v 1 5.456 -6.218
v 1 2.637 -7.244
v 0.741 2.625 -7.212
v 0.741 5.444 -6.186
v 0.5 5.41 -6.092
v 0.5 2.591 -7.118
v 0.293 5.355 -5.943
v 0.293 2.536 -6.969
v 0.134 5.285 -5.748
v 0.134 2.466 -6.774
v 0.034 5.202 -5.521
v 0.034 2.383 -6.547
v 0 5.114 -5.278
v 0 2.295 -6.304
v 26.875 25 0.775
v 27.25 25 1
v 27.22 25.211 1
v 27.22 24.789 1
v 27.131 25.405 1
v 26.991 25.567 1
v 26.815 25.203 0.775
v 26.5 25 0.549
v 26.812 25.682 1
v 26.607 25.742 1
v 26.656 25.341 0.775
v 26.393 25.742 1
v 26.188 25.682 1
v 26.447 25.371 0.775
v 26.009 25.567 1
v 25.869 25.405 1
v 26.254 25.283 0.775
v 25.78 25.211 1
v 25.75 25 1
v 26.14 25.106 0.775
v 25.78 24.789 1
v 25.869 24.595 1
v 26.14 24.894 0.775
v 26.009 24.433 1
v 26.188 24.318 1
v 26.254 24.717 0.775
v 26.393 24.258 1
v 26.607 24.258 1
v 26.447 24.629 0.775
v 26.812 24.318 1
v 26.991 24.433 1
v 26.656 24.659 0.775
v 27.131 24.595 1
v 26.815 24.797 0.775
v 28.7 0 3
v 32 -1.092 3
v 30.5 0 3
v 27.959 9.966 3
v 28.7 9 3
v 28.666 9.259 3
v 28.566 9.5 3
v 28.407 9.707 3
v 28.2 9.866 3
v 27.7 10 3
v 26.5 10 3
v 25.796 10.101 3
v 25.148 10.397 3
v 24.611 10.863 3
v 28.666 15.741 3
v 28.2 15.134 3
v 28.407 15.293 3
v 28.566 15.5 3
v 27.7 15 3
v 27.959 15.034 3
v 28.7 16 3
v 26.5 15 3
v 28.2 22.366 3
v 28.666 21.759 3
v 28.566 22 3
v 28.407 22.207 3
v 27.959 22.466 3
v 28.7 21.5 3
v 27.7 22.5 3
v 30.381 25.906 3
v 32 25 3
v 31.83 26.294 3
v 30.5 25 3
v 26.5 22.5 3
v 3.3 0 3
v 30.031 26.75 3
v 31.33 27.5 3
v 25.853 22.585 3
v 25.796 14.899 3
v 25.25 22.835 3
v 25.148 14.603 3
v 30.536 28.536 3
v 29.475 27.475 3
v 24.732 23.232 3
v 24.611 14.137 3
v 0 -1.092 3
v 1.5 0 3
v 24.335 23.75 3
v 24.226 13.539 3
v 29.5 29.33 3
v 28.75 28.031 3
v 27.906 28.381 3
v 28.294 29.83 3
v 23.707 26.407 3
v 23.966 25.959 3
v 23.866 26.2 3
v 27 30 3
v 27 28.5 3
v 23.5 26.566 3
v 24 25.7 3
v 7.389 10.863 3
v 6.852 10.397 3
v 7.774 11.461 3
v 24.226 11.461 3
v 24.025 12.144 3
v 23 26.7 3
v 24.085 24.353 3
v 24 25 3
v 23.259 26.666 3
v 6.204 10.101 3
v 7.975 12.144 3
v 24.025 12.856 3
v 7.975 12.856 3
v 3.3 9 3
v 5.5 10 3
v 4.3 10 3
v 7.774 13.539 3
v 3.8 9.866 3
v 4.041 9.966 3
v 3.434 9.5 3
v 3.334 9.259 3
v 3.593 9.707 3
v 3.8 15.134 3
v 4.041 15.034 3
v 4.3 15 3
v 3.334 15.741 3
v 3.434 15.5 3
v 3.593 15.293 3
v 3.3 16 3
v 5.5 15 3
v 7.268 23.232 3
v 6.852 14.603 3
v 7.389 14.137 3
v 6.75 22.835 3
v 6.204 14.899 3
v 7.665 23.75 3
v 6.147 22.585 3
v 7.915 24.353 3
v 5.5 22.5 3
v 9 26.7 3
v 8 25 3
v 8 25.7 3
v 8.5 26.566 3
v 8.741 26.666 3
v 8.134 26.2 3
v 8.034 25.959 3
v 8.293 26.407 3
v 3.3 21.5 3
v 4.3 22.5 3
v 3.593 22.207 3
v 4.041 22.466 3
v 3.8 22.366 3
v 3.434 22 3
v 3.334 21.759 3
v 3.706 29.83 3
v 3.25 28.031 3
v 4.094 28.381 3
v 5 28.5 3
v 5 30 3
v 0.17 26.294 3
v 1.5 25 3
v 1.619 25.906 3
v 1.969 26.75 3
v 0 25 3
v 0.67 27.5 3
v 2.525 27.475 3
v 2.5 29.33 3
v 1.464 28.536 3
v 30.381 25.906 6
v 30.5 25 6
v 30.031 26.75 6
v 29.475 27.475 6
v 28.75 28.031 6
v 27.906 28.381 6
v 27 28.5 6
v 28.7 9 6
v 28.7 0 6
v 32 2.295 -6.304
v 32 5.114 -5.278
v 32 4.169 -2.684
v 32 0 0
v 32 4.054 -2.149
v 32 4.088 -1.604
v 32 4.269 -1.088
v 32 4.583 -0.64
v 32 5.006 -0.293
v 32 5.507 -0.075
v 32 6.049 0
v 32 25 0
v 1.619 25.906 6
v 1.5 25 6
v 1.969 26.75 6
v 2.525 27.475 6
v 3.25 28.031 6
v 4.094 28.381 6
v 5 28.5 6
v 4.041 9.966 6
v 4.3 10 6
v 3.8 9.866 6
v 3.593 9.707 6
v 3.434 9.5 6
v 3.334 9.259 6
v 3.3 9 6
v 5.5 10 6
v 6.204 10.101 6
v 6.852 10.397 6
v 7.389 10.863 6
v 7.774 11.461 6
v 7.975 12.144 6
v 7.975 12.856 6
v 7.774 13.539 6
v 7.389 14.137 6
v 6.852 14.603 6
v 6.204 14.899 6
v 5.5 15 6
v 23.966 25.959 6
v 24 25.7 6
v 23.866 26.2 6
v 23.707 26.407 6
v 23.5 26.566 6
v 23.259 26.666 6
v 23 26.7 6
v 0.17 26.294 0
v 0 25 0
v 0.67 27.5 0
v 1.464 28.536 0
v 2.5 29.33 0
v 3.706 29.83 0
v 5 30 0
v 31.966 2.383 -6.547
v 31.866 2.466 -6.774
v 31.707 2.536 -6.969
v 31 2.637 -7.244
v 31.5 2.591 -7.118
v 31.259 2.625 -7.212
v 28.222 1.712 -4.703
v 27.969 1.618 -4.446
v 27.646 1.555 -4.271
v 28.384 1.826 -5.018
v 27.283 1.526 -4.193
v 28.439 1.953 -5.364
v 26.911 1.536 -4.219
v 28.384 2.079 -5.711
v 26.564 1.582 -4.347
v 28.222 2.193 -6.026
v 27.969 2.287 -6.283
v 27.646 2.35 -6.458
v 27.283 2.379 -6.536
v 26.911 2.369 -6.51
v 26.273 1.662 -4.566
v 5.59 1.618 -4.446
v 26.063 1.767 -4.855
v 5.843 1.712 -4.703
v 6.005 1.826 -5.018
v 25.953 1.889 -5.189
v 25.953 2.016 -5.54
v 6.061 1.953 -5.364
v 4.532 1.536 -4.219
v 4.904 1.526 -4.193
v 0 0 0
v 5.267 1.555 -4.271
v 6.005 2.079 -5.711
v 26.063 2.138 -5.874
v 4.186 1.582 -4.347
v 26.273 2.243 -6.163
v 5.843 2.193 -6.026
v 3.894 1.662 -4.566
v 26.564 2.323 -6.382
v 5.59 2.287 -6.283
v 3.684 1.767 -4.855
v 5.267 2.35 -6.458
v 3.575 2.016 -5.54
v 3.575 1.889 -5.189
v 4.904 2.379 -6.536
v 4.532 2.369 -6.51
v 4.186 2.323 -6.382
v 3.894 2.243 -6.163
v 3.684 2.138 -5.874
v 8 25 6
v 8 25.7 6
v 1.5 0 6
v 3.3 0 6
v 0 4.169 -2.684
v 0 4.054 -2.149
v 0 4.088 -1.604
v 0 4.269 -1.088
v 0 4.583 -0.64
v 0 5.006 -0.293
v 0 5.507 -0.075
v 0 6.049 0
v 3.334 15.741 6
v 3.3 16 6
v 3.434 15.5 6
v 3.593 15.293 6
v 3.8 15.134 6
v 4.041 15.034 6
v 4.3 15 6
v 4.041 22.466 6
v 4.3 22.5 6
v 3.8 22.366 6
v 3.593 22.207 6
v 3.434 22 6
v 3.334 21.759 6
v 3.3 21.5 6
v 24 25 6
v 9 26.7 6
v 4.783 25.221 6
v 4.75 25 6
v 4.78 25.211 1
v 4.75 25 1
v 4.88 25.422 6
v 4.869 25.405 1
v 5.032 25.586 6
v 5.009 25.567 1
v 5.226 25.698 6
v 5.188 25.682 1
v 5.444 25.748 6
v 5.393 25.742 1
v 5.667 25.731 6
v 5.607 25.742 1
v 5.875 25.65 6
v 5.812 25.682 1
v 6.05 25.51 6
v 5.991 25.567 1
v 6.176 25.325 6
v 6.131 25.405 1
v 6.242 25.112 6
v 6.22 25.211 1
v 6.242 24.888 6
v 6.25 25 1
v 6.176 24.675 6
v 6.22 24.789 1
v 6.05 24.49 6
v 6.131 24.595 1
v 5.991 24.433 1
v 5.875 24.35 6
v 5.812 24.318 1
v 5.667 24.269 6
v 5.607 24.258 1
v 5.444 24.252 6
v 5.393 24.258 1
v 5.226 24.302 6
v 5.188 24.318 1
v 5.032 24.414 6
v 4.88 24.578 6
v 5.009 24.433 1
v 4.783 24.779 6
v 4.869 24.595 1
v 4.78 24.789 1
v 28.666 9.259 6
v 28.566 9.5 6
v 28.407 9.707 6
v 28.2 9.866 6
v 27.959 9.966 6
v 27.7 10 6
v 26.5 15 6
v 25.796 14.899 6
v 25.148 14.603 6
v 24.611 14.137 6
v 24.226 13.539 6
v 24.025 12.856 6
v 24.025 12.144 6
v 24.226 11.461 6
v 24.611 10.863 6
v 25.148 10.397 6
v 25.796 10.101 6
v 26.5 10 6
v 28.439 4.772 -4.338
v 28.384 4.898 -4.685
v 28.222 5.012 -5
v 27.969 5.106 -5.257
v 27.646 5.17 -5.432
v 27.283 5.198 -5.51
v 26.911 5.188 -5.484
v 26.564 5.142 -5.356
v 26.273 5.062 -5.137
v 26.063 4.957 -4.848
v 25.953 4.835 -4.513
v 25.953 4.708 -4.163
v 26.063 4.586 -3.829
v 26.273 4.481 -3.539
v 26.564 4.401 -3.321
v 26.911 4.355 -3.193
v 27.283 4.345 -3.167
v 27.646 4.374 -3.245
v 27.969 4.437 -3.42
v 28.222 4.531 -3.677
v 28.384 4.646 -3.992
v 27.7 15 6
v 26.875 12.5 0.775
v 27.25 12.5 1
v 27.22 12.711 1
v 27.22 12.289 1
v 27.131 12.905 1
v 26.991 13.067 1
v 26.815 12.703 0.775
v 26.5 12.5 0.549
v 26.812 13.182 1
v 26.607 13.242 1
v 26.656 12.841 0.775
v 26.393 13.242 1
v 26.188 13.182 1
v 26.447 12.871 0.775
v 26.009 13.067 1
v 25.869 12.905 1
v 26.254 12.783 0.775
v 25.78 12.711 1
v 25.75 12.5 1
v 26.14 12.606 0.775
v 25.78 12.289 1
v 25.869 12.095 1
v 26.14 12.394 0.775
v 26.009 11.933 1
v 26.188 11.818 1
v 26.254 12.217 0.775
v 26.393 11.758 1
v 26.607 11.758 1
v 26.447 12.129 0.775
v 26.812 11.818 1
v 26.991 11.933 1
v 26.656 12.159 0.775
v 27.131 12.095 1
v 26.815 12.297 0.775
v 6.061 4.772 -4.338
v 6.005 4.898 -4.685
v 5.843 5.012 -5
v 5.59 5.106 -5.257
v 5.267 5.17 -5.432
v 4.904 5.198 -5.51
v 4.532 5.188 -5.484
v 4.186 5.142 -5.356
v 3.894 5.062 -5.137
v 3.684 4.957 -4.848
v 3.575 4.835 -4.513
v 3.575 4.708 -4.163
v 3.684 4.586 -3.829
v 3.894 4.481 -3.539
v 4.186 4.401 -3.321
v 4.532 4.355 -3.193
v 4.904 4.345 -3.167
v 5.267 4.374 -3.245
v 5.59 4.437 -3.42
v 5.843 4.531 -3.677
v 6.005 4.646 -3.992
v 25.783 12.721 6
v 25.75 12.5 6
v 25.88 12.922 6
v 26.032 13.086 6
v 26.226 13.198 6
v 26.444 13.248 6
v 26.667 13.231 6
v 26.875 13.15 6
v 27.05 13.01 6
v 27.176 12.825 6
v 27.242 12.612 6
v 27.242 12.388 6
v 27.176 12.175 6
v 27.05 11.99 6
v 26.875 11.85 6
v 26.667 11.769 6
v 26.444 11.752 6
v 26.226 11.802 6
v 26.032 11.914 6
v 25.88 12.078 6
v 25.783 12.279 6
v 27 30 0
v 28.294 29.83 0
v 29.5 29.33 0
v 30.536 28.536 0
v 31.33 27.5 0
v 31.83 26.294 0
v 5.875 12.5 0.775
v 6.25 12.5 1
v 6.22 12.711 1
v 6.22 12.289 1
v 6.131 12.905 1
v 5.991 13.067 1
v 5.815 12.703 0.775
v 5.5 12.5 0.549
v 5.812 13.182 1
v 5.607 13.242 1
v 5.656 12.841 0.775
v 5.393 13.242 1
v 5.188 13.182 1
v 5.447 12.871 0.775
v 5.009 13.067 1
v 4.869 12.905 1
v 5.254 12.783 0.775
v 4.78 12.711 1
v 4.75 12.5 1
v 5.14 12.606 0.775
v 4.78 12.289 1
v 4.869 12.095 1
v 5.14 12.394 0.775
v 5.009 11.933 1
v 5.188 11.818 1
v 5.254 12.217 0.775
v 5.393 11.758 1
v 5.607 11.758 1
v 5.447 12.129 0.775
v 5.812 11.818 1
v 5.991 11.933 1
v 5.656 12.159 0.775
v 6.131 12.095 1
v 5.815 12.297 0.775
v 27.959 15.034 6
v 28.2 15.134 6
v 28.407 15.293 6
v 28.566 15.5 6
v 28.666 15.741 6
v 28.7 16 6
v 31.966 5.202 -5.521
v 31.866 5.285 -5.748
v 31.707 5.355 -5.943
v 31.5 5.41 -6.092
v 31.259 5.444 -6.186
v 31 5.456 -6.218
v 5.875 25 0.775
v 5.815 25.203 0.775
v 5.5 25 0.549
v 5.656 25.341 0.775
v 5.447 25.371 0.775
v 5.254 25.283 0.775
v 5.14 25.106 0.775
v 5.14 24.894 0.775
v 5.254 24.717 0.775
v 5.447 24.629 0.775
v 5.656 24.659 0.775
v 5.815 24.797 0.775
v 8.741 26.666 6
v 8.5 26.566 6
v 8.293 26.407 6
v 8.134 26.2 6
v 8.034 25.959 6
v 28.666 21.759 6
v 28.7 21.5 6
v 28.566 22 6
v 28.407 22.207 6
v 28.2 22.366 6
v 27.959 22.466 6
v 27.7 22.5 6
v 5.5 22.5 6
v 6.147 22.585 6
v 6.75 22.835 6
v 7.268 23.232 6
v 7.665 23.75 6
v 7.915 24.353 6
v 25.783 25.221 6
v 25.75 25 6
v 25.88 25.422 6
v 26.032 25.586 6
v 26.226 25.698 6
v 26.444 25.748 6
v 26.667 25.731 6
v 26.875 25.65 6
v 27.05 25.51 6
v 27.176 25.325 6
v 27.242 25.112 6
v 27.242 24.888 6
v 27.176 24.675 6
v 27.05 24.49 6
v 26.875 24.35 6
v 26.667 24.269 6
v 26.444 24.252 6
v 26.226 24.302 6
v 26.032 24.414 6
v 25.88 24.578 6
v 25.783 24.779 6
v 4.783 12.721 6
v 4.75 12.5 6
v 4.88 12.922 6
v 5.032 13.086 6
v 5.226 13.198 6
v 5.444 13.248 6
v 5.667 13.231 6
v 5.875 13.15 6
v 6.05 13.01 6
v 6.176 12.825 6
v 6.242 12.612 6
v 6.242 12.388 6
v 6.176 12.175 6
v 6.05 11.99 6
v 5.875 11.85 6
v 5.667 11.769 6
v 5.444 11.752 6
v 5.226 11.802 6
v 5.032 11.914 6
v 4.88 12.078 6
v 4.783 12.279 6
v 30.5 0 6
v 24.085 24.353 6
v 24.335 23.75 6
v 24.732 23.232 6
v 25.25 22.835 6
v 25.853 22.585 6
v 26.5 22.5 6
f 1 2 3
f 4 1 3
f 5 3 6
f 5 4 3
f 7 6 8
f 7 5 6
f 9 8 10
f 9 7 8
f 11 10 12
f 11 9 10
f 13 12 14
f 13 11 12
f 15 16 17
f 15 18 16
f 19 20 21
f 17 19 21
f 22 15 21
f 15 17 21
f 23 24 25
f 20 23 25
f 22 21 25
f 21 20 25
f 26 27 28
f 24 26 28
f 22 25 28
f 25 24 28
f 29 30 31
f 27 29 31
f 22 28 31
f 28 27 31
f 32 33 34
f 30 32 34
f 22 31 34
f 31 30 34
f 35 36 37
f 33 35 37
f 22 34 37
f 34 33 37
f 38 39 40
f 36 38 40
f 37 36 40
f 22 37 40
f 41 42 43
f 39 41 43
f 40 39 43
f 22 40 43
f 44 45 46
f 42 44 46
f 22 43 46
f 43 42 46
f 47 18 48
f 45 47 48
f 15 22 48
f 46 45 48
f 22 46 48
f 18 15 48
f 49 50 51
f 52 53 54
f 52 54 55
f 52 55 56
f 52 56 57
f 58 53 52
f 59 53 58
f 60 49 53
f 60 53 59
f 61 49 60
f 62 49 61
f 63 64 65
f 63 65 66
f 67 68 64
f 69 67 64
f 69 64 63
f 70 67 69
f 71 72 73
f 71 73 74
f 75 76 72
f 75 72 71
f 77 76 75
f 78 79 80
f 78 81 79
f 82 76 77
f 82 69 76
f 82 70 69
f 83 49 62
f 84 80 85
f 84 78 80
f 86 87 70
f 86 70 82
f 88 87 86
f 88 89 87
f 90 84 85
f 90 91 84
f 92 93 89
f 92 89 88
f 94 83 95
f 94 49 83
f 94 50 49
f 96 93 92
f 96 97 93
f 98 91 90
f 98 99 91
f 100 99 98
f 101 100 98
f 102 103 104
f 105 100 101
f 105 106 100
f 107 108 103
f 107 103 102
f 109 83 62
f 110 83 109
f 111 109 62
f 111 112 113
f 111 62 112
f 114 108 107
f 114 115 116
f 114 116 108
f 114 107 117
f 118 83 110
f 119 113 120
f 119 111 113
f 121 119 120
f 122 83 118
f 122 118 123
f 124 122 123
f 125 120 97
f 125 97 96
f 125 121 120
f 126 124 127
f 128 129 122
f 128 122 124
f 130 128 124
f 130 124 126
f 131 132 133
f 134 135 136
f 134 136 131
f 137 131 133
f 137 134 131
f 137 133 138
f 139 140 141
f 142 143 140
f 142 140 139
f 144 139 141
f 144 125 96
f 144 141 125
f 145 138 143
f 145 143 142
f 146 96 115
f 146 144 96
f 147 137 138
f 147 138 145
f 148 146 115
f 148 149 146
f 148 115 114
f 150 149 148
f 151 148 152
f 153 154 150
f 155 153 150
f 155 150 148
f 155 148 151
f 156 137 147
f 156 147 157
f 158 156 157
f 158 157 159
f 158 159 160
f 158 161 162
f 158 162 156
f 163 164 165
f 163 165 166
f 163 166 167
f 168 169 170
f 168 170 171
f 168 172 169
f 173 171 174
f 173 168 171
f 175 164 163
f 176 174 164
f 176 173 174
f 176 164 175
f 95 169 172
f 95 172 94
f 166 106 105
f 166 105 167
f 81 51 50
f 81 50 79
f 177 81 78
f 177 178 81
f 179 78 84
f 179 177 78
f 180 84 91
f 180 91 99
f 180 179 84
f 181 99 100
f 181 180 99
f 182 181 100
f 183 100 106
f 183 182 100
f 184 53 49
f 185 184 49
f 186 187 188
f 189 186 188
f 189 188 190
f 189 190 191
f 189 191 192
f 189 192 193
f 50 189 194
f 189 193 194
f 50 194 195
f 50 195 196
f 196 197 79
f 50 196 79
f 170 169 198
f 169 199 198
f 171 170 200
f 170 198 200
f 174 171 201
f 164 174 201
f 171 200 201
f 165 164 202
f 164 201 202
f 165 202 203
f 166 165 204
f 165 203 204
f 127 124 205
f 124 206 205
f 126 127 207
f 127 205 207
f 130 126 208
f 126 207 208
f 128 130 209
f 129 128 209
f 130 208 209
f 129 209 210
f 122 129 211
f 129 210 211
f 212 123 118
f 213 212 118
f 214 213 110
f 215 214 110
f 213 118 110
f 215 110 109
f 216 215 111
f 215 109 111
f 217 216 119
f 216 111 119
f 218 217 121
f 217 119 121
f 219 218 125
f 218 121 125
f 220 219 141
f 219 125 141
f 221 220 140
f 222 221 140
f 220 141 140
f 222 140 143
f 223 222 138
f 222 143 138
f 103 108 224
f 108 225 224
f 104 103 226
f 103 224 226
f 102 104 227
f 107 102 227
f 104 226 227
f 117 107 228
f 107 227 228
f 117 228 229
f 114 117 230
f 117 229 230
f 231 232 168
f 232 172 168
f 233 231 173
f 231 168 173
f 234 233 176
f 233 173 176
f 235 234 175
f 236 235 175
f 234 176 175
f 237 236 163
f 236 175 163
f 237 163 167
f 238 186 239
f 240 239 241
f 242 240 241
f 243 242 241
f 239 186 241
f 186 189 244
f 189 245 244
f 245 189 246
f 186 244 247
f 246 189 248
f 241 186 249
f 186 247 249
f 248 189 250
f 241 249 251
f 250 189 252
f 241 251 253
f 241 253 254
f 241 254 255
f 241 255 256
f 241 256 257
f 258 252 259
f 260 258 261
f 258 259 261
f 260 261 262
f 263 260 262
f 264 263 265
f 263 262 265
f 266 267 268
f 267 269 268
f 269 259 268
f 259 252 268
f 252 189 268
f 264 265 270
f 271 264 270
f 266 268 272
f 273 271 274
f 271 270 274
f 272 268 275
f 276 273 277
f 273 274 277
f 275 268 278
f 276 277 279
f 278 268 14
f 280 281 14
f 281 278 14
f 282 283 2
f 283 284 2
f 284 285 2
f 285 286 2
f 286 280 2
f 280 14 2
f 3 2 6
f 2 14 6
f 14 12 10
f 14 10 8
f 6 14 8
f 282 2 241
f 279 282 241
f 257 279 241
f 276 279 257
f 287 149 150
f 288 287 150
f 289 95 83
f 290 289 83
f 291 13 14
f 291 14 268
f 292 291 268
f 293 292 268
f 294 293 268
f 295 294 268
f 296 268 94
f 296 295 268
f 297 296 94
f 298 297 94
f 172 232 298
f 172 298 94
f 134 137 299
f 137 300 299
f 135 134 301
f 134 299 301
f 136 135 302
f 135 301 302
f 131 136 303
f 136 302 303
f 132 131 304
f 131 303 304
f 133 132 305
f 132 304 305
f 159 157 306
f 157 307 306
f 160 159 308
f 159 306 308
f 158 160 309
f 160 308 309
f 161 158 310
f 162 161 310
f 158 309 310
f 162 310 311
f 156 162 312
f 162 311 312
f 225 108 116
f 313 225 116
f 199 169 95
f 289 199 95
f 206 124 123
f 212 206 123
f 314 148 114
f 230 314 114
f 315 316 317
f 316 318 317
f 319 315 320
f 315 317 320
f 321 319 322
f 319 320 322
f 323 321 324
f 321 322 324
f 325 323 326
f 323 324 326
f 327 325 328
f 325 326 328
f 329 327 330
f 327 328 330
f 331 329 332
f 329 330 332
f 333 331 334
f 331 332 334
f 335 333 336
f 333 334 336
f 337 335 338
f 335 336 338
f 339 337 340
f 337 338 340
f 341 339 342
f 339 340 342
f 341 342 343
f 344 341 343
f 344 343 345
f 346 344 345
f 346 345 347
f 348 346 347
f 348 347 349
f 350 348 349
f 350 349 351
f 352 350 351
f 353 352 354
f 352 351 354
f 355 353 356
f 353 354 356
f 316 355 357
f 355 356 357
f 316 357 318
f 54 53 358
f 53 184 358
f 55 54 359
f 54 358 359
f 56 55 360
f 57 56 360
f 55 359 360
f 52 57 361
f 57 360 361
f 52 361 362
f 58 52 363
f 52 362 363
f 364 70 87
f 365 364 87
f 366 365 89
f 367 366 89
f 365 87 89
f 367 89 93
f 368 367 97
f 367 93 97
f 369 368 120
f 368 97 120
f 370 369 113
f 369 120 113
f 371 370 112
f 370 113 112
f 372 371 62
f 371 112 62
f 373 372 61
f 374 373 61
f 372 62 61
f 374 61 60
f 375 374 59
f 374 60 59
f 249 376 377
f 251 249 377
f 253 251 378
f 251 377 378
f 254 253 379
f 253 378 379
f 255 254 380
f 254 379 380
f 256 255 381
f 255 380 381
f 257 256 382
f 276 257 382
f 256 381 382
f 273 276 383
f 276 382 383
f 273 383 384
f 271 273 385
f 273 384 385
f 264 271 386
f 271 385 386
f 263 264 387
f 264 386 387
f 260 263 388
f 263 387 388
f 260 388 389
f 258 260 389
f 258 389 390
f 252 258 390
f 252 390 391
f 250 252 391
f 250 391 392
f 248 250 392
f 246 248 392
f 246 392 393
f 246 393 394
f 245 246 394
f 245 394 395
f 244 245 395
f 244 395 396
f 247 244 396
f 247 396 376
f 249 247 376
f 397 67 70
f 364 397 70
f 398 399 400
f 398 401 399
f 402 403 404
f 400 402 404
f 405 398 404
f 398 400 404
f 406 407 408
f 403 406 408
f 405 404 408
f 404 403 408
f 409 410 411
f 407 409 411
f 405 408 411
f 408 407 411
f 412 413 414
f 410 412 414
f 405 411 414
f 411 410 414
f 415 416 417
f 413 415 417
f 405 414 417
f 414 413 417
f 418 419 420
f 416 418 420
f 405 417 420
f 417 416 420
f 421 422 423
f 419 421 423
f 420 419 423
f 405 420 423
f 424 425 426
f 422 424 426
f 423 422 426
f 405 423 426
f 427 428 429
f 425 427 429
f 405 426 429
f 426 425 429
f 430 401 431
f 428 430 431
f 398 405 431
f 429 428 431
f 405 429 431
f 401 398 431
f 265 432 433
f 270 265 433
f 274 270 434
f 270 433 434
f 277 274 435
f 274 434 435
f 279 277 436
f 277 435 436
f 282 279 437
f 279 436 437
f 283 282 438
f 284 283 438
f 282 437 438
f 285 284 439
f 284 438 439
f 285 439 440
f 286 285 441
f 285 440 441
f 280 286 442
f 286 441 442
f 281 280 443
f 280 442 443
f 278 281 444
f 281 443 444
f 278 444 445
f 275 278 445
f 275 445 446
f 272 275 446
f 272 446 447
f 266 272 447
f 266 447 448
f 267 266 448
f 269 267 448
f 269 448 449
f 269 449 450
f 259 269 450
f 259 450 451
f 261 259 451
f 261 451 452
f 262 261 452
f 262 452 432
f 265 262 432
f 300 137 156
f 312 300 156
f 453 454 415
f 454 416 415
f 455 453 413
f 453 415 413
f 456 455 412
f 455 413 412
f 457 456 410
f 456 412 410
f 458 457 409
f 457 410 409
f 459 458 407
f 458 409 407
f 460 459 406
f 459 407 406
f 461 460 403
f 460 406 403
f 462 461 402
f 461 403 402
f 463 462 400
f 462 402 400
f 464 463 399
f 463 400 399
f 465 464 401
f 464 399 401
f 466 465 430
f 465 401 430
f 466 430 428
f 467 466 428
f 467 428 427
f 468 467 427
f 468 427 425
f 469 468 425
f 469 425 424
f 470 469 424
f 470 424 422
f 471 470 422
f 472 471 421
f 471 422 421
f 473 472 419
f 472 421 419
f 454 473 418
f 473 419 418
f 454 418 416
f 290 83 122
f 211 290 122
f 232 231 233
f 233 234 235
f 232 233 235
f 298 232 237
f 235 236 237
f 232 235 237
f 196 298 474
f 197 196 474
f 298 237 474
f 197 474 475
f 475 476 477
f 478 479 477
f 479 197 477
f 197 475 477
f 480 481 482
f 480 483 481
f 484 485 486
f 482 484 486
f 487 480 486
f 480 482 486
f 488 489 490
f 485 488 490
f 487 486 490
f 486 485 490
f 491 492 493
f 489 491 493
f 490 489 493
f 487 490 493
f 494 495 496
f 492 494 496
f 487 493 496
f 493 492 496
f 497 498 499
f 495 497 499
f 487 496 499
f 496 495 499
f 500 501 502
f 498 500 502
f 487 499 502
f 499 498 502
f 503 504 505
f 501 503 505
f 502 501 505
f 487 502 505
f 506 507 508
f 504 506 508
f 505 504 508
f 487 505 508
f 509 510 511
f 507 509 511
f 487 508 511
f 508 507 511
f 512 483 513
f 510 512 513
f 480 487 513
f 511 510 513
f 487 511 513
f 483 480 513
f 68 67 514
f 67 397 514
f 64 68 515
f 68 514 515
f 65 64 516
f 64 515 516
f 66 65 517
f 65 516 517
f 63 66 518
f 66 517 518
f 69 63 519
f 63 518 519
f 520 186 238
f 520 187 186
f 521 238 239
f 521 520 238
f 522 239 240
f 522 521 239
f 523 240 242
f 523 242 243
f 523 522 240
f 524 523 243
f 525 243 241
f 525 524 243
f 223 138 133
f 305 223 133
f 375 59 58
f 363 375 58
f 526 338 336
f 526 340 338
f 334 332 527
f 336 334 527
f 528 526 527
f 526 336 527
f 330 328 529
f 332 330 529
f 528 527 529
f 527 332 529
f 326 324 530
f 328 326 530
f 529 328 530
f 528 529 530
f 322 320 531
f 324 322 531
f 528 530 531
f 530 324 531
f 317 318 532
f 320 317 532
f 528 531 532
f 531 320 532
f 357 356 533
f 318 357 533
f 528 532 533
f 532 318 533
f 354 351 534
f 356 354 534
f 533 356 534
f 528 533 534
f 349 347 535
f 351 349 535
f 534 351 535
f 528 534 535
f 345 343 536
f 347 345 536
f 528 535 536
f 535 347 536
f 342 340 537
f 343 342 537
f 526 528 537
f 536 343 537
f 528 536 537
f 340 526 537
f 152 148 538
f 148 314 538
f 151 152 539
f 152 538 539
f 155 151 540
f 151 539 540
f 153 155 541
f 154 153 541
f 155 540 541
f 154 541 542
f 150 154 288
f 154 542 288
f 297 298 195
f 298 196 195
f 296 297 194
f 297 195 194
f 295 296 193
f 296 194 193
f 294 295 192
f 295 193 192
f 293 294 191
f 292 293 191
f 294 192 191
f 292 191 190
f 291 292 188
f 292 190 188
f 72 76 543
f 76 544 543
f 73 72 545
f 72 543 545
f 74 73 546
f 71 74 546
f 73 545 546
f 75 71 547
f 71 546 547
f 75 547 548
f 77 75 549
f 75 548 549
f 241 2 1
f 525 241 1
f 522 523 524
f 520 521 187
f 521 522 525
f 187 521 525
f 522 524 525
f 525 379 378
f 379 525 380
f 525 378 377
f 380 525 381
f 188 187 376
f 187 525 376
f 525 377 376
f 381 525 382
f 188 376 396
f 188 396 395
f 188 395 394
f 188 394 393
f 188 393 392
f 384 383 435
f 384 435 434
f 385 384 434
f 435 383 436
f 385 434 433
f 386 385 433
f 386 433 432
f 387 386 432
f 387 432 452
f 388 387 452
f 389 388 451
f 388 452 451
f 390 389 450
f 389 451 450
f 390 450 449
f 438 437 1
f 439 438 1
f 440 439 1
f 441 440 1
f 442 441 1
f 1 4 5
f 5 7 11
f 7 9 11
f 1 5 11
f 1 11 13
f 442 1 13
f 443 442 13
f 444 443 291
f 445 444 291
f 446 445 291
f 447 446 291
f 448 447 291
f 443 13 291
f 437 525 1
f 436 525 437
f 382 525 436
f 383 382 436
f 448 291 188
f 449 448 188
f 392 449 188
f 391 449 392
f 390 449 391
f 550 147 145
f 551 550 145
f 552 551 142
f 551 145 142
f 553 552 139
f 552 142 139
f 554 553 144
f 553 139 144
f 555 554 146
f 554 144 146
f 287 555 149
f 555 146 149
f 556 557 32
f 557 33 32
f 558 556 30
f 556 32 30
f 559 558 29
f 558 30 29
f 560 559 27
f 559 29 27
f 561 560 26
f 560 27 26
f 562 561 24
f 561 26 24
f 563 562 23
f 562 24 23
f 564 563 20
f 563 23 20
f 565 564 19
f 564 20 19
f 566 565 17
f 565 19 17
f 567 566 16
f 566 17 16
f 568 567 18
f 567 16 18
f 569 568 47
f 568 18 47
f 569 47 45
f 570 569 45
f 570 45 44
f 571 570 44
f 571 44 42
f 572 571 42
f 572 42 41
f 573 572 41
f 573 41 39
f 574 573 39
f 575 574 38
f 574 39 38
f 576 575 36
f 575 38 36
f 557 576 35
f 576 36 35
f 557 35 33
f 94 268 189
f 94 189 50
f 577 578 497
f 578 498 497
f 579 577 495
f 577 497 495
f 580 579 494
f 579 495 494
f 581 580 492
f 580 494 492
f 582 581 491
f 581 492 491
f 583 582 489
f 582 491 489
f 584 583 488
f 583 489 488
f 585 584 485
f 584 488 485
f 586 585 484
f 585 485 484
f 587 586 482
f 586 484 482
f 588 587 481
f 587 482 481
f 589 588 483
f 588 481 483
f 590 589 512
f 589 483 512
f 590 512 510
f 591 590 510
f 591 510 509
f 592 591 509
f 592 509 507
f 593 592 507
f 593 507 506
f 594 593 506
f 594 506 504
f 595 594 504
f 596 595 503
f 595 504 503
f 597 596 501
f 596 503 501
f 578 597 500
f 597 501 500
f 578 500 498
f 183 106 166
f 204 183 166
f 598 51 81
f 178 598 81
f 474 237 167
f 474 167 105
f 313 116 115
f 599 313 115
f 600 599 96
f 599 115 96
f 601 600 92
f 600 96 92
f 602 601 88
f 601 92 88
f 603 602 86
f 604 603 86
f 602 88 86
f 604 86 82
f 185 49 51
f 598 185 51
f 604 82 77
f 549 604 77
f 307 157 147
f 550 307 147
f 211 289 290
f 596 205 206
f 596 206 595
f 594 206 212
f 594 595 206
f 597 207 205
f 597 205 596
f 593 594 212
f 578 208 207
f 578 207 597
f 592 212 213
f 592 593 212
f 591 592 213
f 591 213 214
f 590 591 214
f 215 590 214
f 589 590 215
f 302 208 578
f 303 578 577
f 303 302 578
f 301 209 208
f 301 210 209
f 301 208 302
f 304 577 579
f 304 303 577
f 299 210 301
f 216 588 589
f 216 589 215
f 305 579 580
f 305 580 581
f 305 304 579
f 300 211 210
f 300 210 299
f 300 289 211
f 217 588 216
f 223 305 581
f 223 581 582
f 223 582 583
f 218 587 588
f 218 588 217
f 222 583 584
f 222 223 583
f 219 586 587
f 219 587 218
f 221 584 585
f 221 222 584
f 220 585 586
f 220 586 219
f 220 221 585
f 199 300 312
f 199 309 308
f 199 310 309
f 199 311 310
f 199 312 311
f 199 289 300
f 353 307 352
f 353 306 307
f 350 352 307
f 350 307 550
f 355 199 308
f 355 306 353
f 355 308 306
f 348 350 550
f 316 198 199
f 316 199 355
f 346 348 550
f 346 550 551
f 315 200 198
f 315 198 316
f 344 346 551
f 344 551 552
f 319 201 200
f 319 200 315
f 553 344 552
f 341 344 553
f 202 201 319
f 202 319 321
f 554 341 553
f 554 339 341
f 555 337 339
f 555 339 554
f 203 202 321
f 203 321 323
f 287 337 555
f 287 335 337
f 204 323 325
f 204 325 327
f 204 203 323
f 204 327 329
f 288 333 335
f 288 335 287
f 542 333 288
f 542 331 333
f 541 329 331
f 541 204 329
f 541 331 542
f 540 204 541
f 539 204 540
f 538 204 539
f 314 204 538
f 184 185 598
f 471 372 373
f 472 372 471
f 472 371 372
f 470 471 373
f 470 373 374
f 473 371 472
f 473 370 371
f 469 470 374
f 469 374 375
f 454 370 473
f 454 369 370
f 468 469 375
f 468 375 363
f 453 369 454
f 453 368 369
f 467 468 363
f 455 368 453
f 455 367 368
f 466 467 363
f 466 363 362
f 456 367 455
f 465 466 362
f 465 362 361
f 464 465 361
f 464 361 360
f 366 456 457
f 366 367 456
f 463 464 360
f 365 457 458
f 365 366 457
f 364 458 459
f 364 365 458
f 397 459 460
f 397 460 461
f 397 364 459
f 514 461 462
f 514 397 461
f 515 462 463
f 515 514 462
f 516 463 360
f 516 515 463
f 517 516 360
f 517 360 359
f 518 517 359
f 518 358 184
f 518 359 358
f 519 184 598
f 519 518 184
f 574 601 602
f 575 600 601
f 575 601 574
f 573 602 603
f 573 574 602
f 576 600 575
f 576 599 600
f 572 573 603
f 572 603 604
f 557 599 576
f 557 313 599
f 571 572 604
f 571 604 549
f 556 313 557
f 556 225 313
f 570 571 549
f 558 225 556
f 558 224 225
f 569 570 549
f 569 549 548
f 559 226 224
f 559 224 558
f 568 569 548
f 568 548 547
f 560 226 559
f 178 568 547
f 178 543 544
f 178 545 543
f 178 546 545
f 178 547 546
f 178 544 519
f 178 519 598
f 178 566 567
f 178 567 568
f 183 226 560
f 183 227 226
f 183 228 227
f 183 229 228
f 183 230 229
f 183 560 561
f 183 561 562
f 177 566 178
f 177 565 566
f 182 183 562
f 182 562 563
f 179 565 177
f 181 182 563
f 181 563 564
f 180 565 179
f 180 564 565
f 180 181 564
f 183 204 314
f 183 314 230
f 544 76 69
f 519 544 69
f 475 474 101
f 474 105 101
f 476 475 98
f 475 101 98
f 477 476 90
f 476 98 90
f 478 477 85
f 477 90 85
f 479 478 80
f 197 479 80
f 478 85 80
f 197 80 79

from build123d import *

# Parameters (mm, degrees)
SKETCH1_W                           = 32
SKETCH1_H                           = 30
BOSS_EXTRUDE1_DEPTH                 = 3
BOSS_EXTRUDE2_DEPTH                 = 3
F_1_5MM_CLEARANCE_DOWEL_HOLE1_D     = 1.5
F_1_5MM_CLEARANCE_DOWEL_HOLE1_DEPTH = 5
F_1_5MM_CLEARANCE_DOWEL_HOLE1_TIP   = 0.450645464
FILLET1_R                           = 5
FILLET2_R                           = 3.5
BOSS_EXTRUDE4_DEPTH                 = 32
BOSS_EXTRUDE5_DEPTH                 = 32
SKETCH8_R                           = 1.25
CUT_EXTRUDE1_DEPTH                  = 7.503603871
FILLET3_R                           = 1
FILLET4_R                           = 2
FILLET5_R                           = 1


with BuildPart() as part:
    # Sketch1 → Boss-Extrude1 (new body)
    with BuildSketch(Plane.XY):
        with Locations((16, 15)):
            Rectangle(SKETCH1_W, SKETCH1_H)
    extrude(amount=BOSS_EXTRUDE1_DEPTH)

    # Sketch2 → Boss-Extrude2 (add)
    with BuildSketch(Plane.XY.offset(3)):
        with BuildLine():
            Line((1.5, 0), (3.3, 0))
            Line((3.3, 0), (3.3, 10))
            Line((3.3, 10), (5.5, 10))
            ThreePointArc((5.5, 10), (8, 12.5), (5.5, 15))
            Line((5.5, 15), (3.3, 15))
            Line((3.3, 15), (3.3, 22.5))
            Line((3.3, 22.5), (5.5, 22.5))
            ThreePointArc((5.5, 22.5), (7.267766953, 23.232233047), (8, 25))
            Line((8, 25), (8, 26.7))
            Line((8, 26.7), (24, 26.7))
            Line((24, 26.7), (24, 25))
            ThreePointArc((24, 25), (24.732233047, 23.232233047), (26.5, 22.5))
            Line((26.5, 22.5), (28.7, 22.5))
            Line((28.7, 22.5), (28.7, 15))
            Line((28.7, 15), (26.5, 15))
            ThreePointArc((26.5, 15), (24, 12.5), (26.5, 10))
            Line((26.5, 10), (28.7, 10))
            Line((28.7, 10), (28.7, 0))
            Line((28.7, 0), (30.5, 0))
            Line((30.5, 0), (30.5, 28.5))
            Line((30.5, 28.5), (1.5, 28.5))
            Line((1.5, 28.5), (1.5, 0))
        make_face()
    extrude(amount=BOSS_EXTRUDE2_DEPTH)

    # Ø1.5mm Clearance Dowel Hole1
    with Locations(Plane(origin=(5.5, 25, 6), x_dir=(1, 0, 0), z_dir=(0, 0, 1))):
        with Locations((0, 0), (21, 0), (21, -12.5), (0, -12.5)):
            Hole(F_1_5MM_CLEARANCE_DOWEL_HOLE1_D / 2, depth=F_1_5MM_CLEARANCE_DOWEL_HOLE1_DEPTH)
            with Locations((0, 0, -(F_1_5MM_CLEARANCE_DOWEL_HOLE1_DEPTH + F_1_5MM_CLEARANCE_DOWEL_HOLE1_TIP / 2))):  # 118° drill point
                Cone(0, F_1_5MM_CLEARANCE_DOWEL_HOLE1_D / 2, F_1_5MM_CLEARANCE_DOWEL_HOLE1_TIP, mode=Mode.SUBTRACT)

    # Fillet1
    fillet1_edges = [part.edges().sort_by_distance(p)[0] for p in [
        (0, 30, 1.5),
        (32, 30, 1.5),
    ]]
    fillet(fillet1_edges, radius=FILLET1_R)

    # Fillet2
    fillet2_edges = [part.edges().sort_by_distance(p)[0] for p in [
        (1.5, 28.5, 4.5),
        (30.5, 28.5, 4.5),
    ]]
    fillet(fillet2_edges, radius=FILLET2_R)

    # Sketch5 → Boss-Extrude4 (add)
    with BuildSketch(Plane.ZY):
        Polygon((0, 0), (-7.243852416, 2.636546661), (-6.217791986, 5.455624523), (0, 3.192533317), align=None)
    extrude(amount=-BOSS_EXTRUDE4_DEPTH)

    # Sketch7 → Boss-Extrude5 (add)
    with BuildSketch(Plane.ZY):
        Polygon((0, 0), (3, -1.091910703), (3, 0), align=None)
    extrude(amount=-BOSS_EXTRUDE5_DEPTH)

    # Sketch8 → Cut-Extrude1 (cut, through all)
    with BuildSketch(Plane(origin=(0, 2.819077862, 1.02606043), x_dir=(1, 0, 0), z_dir=(0, 0.939692621, 0.342020143))):
        with Locations((4.810584477, 5.708746728)):
            Circle(SKETCH8_R)
        with Locations((27.189415523, 5.708746728)):
            Circle(SKETCH8_R)
    extrude(amount=-CUT_EXTRUDE1_DEPTH, mode=Mode.SUBTRACT)

    # Fillet3
    fillet3_edges = [part.edges().sort_by_distance(p)[0] for p in [
        (3.3, 10, 4.5),
        (3.3, 15, 4.5),
        (3.3, 22.5, 4.5),
        (8, 26.7, 4.5),
        (24, 26.7, 4.5),
        (28.7, 22.5, 4.5),
        (28.7, 15, 4.5),
        (28.7, 10, 4.5),
    ]]
    fillet(fillet3_edges, radius=FILLET3_R)

    # Fillet4
    fillet4_edges = [part.edges().sort_by_distance(p)[0] for p in [
        (16, 3.192533317, 0),
    ]]
    fillet(fillet4_edges, radius=FILLET4_R)

    # Fillet5
    fillet5_edges = [part.edges().sort_by_distance(p)[0] for p in [
        (0, 4.046085592, -6.730822201),
        (32, 4.046085592, -6.730822201),
    ]]
    fillet(fillet5_edges, radius=FILLET5_R)


solid = part.part
